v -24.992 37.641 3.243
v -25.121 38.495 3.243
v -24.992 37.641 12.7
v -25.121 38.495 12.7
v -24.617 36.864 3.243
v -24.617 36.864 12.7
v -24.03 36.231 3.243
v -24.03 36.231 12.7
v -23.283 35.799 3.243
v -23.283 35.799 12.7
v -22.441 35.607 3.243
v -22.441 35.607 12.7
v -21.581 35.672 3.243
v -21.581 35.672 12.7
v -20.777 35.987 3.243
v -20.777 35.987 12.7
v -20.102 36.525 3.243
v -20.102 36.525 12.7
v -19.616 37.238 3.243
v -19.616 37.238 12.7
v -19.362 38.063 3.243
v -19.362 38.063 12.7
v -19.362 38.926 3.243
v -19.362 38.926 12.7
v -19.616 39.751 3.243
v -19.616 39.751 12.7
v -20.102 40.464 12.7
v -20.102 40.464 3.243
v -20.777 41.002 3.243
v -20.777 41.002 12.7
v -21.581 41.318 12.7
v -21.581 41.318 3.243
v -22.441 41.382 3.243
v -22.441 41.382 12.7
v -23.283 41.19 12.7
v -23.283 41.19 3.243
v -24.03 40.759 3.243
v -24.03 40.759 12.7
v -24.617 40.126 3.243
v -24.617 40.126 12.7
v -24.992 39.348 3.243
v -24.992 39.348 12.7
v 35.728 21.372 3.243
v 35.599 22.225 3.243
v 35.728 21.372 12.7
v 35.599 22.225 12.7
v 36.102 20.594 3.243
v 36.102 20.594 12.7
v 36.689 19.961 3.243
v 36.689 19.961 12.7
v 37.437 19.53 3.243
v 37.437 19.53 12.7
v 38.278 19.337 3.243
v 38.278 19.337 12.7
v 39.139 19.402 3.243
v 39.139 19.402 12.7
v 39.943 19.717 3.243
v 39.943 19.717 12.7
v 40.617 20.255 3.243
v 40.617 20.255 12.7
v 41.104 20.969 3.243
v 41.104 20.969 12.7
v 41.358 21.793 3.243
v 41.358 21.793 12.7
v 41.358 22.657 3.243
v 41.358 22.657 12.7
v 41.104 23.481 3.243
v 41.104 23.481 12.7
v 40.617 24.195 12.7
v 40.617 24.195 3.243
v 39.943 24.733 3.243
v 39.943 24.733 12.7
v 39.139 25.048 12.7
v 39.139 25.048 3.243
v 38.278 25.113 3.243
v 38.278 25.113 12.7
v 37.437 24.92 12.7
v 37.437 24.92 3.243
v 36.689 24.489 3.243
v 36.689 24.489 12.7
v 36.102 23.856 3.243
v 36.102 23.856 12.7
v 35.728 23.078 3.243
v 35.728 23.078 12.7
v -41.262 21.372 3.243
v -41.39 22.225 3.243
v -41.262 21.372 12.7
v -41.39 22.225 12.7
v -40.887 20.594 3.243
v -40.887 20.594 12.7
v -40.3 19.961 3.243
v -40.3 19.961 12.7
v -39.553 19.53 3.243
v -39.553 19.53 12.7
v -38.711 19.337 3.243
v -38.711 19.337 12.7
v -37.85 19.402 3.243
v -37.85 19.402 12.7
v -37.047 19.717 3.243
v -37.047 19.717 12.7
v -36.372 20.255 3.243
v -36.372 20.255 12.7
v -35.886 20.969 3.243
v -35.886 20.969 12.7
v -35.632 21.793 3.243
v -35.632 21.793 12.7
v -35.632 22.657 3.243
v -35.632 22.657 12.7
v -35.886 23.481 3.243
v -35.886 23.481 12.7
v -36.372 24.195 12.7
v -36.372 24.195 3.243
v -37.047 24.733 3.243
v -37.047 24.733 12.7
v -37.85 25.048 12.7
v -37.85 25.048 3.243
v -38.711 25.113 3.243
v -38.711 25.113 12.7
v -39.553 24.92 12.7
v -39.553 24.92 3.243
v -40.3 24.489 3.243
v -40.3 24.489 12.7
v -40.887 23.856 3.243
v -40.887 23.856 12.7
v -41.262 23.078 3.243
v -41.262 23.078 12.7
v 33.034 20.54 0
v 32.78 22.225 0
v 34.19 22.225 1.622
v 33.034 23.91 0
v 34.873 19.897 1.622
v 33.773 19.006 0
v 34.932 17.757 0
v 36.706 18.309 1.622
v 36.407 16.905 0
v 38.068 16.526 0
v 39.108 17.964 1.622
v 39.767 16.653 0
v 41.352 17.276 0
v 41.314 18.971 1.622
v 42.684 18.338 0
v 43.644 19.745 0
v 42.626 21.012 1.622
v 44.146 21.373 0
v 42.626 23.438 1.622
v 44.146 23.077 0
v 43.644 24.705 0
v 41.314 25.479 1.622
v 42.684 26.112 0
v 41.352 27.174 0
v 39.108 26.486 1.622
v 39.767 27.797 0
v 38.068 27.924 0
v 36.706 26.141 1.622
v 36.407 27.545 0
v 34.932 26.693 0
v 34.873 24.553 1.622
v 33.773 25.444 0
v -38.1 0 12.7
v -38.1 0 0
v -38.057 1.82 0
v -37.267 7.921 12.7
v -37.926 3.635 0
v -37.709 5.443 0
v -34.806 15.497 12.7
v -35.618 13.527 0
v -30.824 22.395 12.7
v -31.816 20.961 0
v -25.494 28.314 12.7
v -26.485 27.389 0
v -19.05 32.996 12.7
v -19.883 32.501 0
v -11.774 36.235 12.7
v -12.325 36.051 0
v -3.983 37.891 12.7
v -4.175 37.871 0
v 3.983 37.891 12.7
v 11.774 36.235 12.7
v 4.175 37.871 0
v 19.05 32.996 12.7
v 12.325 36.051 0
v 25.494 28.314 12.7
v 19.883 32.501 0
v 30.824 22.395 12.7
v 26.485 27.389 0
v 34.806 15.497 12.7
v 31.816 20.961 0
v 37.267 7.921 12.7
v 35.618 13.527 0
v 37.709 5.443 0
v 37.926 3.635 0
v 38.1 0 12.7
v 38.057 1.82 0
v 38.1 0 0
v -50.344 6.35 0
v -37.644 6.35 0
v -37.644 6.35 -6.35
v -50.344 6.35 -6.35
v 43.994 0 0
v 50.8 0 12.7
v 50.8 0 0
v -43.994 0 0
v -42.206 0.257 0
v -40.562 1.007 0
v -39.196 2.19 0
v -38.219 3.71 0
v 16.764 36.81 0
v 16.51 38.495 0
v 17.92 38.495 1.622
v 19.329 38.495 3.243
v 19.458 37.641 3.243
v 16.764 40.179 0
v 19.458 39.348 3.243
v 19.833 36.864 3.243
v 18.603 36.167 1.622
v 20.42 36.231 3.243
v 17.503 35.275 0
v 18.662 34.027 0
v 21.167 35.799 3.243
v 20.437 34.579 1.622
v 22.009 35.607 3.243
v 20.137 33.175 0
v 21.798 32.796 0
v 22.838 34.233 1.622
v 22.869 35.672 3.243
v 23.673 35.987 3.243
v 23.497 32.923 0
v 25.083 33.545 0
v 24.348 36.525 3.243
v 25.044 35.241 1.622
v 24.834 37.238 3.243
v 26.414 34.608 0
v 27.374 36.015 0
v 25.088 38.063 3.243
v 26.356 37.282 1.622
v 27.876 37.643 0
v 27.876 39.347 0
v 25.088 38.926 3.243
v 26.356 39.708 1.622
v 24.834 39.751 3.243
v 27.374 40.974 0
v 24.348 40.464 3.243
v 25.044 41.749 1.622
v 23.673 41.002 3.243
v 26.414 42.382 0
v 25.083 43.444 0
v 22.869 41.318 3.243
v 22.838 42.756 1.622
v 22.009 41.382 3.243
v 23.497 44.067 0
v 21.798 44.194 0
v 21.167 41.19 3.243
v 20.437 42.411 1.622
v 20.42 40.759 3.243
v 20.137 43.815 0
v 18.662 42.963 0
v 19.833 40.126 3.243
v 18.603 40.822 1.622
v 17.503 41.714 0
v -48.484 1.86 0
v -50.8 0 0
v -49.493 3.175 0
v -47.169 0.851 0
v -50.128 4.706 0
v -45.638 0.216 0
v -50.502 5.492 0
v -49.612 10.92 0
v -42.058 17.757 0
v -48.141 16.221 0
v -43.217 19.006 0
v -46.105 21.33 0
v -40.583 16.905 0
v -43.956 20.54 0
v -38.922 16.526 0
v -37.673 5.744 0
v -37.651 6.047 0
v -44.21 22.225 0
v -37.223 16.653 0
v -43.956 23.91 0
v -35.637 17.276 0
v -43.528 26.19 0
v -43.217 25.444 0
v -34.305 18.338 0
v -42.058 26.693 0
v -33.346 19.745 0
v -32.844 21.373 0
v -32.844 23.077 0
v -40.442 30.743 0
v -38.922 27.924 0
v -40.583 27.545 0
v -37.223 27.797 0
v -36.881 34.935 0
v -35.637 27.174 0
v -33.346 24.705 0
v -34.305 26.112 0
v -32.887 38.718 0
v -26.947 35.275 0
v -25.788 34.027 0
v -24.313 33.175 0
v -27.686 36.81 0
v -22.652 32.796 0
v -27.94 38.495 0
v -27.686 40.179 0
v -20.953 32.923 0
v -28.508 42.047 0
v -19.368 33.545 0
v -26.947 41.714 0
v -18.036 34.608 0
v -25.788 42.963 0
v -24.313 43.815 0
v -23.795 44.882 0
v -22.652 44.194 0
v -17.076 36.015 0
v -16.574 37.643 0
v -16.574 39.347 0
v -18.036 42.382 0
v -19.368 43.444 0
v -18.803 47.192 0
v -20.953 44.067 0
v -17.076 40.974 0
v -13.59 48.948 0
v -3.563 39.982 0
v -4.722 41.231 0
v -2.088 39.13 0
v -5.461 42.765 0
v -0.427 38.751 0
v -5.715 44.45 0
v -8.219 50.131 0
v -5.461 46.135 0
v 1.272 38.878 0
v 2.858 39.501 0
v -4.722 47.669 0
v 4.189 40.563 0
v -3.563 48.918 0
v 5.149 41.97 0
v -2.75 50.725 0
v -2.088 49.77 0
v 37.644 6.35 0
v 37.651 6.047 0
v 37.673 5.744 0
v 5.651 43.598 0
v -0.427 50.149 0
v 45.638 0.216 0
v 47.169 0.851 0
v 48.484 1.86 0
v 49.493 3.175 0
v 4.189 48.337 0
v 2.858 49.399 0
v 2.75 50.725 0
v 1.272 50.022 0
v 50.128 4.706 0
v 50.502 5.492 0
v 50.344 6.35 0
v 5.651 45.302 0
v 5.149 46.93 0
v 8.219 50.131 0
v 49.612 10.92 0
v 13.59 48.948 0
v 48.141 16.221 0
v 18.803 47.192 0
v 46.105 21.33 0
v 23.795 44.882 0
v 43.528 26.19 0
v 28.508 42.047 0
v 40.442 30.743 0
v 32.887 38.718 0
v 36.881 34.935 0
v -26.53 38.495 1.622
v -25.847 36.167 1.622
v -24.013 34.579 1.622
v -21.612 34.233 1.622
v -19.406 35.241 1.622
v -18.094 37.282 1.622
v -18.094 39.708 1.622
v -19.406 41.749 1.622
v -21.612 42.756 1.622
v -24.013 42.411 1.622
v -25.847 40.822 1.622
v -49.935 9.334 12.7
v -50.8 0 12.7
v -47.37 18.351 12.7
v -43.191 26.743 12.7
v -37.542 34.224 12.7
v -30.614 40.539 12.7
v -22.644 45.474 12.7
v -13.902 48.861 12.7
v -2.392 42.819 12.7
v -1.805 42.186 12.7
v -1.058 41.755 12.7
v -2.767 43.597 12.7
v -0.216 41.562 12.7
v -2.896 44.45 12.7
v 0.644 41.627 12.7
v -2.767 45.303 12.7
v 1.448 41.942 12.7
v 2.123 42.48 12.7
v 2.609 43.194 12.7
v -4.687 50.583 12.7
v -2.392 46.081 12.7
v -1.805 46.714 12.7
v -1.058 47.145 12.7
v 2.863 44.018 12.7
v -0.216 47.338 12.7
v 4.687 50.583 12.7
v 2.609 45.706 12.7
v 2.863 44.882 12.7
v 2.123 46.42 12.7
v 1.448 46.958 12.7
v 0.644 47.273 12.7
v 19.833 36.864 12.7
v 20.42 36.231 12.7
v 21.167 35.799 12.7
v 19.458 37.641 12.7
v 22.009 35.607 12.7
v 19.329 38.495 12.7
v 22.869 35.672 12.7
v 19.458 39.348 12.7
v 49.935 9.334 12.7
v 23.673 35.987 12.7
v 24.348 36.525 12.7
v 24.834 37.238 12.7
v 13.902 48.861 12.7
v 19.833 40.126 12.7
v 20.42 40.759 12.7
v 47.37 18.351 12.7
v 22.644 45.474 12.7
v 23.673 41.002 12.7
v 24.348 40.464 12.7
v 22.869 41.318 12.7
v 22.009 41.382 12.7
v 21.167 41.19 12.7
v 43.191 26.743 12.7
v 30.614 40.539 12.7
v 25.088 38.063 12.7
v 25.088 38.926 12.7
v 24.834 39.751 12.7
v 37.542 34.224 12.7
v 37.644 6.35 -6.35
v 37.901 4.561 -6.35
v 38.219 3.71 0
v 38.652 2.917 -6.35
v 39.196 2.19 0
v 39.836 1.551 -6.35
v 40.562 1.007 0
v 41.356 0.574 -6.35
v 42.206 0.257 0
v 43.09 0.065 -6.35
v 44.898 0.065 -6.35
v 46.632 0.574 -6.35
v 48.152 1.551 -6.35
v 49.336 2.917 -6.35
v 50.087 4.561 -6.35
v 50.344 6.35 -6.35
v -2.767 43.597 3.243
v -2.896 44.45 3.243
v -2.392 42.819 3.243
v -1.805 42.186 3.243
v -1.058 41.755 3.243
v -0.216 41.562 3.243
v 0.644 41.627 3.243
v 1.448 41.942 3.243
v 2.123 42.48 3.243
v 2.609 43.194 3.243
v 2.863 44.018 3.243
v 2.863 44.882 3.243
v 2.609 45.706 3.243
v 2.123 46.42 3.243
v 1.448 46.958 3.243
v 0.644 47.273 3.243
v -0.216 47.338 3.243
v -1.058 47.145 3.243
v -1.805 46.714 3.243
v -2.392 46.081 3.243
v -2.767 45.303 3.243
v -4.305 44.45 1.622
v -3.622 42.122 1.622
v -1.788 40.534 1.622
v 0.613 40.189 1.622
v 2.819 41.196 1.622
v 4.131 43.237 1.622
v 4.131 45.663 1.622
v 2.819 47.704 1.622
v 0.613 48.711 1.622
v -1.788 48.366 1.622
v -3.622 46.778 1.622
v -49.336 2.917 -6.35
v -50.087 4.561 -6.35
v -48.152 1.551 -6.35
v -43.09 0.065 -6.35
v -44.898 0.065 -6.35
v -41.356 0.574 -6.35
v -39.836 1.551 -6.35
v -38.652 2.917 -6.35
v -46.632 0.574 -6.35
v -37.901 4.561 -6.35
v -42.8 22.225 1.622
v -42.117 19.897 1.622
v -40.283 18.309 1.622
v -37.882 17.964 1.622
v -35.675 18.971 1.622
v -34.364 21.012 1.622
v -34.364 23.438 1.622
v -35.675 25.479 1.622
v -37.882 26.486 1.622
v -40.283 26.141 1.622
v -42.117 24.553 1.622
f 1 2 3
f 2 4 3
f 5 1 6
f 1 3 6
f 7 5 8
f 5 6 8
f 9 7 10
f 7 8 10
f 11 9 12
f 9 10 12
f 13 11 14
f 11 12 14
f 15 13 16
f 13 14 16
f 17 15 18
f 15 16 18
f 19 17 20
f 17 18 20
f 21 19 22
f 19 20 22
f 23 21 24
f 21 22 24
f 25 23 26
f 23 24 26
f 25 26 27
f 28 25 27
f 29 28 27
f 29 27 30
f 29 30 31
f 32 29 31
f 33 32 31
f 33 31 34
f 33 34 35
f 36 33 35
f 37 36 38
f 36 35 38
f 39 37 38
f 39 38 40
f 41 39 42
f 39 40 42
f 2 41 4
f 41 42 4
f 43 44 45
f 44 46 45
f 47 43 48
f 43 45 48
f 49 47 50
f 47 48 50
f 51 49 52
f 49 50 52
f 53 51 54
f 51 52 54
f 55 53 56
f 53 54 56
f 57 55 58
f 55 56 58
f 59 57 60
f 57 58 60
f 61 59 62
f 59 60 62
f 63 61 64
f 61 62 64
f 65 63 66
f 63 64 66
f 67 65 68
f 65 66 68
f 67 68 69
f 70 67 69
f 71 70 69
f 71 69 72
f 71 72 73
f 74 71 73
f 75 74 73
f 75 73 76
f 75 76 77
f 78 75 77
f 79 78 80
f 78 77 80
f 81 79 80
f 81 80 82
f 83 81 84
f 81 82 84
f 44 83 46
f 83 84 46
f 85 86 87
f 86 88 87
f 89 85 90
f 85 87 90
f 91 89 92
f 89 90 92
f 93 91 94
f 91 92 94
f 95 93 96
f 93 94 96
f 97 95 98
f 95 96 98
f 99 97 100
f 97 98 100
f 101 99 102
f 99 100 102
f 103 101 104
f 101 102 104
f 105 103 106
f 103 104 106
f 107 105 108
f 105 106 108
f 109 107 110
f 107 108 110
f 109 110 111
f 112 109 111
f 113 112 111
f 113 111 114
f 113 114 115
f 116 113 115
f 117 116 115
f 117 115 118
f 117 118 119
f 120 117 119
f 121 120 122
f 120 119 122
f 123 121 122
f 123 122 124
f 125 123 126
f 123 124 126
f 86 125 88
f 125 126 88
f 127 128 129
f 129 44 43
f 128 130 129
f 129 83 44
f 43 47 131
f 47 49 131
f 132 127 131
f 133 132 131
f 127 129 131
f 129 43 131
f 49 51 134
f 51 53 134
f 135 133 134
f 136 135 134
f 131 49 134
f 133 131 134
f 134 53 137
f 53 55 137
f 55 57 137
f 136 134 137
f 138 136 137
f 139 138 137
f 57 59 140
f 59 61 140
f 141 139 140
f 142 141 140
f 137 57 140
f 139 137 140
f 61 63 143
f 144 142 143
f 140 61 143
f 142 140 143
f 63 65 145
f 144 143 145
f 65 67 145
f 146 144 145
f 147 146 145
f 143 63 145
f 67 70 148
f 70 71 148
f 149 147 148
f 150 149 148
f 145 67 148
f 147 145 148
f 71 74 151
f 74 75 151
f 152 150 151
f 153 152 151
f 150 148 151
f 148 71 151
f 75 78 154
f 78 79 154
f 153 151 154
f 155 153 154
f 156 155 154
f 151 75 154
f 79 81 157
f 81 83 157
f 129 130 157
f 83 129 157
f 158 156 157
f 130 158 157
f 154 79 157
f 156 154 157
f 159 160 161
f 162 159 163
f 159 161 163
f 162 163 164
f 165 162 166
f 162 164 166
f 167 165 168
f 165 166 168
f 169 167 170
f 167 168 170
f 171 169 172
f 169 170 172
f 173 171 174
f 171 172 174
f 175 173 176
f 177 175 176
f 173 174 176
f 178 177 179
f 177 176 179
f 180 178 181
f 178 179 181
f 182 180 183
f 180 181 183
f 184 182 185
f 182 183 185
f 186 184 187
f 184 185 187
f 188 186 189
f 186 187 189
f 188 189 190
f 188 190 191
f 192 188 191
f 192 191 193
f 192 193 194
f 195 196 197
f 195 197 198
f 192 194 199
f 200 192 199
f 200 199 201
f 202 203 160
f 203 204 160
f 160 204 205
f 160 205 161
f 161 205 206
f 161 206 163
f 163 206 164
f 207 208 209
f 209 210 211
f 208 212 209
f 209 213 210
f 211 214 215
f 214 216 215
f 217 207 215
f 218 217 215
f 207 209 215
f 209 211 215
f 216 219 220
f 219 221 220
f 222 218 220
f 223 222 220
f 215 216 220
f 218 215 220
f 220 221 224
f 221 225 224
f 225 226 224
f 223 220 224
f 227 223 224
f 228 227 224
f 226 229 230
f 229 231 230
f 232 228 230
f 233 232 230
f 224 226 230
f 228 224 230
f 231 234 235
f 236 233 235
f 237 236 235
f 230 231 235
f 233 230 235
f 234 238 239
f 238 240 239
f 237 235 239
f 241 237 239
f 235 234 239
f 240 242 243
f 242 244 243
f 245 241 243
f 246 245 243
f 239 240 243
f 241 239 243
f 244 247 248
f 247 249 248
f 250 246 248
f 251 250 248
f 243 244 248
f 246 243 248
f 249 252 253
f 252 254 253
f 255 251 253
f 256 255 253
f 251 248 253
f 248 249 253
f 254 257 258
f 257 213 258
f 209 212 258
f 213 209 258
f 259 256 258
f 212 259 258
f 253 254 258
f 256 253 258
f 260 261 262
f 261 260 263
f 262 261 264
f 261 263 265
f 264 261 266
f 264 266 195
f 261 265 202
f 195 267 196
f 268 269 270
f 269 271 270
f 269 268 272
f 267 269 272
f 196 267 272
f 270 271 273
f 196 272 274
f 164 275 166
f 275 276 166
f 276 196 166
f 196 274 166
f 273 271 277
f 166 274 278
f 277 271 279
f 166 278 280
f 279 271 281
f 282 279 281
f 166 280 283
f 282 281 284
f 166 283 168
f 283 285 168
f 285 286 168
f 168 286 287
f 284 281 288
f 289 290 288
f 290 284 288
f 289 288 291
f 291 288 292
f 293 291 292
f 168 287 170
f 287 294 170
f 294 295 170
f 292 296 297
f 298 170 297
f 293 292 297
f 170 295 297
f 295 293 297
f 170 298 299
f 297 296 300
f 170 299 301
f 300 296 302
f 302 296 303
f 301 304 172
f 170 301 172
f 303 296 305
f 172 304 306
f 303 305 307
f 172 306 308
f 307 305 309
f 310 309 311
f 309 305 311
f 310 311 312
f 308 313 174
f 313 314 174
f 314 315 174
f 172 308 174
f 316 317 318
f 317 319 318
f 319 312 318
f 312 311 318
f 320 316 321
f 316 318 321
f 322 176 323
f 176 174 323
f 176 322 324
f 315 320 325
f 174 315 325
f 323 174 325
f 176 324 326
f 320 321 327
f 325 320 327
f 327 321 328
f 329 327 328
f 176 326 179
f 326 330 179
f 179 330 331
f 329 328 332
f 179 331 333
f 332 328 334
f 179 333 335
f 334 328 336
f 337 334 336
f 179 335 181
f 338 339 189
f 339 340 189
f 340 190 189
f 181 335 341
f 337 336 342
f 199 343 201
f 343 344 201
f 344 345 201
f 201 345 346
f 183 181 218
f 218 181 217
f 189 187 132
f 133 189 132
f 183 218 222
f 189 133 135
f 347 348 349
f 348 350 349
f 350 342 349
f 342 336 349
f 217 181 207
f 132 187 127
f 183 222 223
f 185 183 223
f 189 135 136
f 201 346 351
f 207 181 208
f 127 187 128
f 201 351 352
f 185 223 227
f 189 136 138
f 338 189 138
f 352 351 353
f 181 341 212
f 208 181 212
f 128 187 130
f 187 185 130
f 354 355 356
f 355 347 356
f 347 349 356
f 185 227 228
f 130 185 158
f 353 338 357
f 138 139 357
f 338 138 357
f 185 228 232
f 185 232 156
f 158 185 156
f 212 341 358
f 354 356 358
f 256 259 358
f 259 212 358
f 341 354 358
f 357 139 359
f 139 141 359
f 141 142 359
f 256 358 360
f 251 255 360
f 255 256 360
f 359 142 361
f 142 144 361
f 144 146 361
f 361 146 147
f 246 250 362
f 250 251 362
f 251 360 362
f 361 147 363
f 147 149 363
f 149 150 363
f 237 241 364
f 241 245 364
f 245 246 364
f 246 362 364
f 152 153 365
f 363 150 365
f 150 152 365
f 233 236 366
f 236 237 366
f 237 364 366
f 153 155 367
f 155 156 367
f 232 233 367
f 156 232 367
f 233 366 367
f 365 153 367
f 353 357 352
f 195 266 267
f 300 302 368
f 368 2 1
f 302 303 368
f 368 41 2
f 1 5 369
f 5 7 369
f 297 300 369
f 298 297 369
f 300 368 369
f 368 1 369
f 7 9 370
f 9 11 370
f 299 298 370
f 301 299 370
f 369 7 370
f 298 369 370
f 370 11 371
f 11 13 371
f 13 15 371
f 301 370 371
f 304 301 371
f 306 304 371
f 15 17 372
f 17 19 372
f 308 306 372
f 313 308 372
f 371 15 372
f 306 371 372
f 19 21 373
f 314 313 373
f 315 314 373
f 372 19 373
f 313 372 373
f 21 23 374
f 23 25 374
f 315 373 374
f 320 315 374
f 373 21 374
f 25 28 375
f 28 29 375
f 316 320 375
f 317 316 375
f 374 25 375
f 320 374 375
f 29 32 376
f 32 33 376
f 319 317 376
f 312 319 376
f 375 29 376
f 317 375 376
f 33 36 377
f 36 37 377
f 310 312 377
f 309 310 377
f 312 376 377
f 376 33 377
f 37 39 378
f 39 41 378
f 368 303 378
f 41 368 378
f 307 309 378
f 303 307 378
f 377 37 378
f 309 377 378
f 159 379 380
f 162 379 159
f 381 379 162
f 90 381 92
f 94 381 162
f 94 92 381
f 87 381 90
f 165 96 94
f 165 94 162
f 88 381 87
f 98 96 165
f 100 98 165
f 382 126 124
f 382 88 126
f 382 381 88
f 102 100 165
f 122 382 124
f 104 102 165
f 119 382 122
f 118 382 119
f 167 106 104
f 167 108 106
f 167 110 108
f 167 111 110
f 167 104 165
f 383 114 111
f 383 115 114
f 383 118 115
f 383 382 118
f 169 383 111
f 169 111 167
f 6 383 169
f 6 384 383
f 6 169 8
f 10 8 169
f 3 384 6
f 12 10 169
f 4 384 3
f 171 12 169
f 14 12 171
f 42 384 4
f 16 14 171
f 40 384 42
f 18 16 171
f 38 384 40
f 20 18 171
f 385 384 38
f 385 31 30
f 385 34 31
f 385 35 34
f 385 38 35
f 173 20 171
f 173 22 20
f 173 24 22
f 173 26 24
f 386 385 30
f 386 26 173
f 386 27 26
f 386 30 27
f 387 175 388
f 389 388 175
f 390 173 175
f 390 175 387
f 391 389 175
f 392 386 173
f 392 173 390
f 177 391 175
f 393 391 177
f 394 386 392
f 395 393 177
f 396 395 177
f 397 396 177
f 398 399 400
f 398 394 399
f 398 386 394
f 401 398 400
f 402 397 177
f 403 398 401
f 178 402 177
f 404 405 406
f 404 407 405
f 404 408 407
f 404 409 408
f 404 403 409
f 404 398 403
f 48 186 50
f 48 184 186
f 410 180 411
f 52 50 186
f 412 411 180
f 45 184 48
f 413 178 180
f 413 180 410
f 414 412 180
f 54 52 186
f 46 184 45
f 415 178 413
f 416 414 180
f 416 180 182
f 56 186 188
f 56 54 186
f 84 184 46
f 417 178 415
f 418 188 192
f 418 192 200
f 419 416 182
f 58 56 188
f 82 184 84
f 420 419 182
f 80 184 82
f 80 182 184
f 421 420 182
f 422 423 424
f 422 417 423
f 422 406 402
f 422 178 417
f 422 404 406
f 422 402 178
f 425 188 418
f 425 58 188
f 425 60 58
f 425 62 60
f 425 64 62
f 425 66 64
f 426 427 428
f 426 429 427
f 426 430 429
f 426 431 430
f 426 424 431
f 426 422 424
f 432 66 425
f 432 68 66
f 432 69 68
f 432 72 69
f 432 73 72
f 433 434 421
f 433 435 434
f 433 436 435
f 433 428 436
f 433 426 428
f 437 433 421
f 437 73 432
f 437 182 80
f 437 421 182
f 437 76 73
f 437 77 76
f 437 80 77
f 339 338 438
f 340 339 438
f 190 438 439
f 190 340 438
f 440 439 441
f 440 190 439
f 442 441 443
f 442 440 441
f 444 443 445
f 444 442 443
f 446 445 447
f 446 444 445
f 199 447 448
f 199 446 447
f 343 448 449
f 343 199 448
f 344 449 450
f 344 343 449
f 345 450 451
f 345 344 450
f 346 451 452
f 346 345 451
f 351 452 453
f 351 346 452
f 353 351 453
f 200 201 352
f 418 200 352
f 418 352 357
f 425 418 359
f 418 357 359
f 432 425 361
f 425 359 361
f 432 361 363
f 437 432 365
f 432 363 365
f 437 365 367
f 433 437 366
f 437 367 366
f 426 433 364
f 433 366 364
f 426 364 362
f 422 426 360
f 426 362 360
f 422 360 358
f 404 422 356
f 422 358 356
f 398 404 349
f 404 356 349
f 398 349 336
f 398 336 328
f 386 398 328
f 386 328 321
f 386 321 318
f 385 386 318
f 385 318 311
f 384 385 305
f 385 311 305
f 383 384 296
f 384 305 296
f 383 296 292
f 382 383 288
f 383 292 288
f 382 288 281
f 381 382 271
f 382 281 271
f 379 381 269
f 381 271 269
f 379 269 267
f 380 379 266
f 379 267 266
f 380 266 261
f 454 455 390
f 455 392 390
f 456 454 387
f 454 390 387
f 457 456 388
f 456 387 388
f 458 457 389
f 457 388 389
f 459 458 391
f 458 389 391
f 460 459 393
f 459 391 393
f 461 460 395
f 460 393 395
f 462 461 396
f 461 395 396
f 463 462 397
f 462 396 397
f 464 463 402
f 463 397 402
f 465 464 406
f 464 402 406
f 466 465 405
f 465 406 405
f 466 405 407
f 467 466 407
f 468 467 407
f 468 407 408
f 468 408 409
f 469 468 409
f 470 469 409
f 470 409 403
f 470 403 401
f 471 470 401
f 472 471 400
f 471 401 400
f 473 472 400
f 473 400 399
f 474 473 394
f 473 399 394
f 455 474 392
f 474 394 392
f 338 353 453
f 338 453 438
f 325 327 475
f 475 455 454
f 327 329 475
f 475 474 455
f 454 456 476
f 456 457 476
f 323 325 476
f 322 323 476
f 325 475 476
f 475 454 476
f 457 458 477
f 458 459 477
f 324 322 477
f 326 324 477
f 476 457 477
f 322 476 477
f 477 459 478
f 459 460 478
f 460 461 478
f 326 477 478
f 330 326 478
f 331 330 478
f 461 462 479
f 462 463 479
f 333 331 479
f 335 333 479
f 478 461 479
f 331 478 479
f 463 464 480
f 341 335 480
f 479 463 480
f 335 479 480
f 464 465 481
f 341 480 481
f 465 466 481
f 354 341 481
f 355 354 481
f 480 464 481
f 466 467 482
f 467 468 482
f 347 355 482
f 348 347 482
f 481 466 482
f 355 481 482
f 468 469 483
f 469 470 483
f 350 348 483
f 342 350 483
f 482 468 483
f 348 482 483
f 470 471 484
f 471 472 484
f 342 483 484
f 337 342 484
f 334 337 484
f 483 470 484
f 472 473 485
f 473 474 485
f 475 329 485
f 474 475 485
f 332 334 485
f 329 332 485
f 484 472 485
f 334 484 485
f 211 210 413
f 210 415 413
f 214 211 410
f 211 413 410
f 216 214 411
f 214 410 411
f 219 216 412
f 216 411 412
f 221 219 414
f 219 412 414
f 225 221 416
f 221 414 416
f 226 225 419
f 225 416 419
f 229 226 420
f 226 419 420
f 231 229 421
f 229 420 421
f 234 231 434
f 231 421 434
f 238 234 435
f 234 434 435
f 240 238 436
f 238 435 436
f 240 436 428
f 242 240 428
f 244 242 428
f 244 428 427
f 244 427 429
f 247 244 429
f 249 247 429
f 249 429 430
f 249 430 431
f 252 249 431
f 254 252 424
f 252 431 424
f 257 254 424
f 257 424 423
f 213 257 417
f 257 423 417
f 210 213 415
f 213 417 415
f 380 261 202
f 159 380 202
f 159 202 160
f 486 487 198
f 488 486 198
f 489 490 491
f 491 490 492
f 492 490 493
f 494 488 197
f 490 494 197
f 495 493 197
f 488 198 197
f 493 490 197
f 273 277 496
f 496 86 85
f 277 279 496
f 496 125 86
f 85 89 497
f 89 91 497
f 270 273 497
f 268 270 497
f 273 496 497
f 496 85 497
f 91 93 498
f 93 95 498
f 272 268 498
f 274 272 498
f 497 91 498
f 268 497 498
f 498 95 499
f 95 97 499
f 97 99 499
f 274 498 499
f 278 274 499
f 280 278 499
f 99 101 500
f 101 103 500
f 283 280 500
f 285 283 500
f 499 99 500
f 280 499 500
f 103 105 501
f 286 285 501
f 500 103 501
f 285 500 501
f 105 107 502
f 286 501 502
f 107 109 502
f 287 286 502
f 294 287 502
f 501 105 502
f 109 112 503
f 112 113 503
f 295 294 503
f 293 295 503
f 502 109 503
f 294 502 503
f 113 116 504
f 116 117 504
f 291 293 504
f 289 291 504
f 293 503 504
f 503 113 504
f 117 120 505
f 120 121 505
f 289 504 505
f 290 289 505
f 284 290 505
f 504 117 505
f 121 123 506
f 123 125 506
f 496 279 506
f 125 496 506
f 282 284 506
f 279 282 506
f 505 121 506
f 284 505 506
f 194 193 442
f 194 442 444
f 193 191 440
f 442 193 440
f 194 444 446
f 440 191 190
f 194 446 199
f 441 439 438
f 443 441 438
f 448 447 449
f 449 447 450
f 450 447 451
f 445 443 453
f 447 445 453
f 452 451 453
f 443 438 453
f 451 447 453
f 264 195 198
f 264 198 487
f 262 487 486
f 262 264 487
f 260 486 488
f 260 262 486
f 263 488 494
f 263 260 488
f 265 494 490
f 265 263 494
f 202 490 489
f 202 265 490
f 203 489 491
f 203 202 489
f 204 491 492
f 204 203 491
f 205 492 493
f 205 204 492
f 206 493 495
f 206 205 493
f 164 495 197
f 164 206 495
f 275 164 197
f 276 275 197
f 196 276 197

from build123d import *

# Parameters (mm, degrees)
F1_DEPTH       = 12.7
F3_DEPTH       = 6.35
F5_D           = 5.7912
F5_CSINK_D     = 11.43
F5_CSINK_ANGLE = 82


with BuildPart() as f1:
    # F0 (on Top) → F1 (new body)
    with BuildSketch(Plane.XY):
        with BuildLine():
            ThreePointArc((50.8, 0), (0, 50.8), (-50.8, 0))
            Line((-50.8, 0), (-38.1, 0))
            ThreePointArc((-38.1, 0), (0, 38.1), (38.1, 0))
            Line((38.1, 0), (50.8, 0))
        make_face()
    extrude(amount=F1_DEPTH)

    # F2 (on Top) → F3 (join)
    with BuildSketch(Plane.XY):
        with BuildLine():
            Line((43.9940905122, 6.35), (37.6440905122, 6.35))
            ThreePointArc((37.6440905122, 6.35), (43.9940905122, 0), (50.3440905122, 6.35))
            Line((50.3440905122, 6.35), (43.9940905122, 6.35))
        make_face()
        with BuildLine():
            ThreePointArc((-50.3440905122, 6.35), (-43.9940905122, 0), (-37.6440905122, 6.35))
            Line((-37.6440905122, 6.35), (-43.9940905122, 6.35))
            Line((-43.9940905122, 6.35), (-50.3440905122, 6.35))
        make_face()
    extrude(amount=-F3_DEPTH)

    # F5 (through all)
    with Locations(Plane(origin=(0, 0, 0), x_dir=(1, 0, 0), z_dir=(0, 0, -1))):
        with Locations((-38.4948291982, -22.225), (-22.225, -38.4948291982), (0, -44.45), (22.225, -38.4948291982), (38.4948291982, -22.225)):
            CounterSinkHole(F5_D / 2, F5_CSINK_D / 2, counter_sink_angle=F5_CSINK_ANGLE)


solid = f1.part
